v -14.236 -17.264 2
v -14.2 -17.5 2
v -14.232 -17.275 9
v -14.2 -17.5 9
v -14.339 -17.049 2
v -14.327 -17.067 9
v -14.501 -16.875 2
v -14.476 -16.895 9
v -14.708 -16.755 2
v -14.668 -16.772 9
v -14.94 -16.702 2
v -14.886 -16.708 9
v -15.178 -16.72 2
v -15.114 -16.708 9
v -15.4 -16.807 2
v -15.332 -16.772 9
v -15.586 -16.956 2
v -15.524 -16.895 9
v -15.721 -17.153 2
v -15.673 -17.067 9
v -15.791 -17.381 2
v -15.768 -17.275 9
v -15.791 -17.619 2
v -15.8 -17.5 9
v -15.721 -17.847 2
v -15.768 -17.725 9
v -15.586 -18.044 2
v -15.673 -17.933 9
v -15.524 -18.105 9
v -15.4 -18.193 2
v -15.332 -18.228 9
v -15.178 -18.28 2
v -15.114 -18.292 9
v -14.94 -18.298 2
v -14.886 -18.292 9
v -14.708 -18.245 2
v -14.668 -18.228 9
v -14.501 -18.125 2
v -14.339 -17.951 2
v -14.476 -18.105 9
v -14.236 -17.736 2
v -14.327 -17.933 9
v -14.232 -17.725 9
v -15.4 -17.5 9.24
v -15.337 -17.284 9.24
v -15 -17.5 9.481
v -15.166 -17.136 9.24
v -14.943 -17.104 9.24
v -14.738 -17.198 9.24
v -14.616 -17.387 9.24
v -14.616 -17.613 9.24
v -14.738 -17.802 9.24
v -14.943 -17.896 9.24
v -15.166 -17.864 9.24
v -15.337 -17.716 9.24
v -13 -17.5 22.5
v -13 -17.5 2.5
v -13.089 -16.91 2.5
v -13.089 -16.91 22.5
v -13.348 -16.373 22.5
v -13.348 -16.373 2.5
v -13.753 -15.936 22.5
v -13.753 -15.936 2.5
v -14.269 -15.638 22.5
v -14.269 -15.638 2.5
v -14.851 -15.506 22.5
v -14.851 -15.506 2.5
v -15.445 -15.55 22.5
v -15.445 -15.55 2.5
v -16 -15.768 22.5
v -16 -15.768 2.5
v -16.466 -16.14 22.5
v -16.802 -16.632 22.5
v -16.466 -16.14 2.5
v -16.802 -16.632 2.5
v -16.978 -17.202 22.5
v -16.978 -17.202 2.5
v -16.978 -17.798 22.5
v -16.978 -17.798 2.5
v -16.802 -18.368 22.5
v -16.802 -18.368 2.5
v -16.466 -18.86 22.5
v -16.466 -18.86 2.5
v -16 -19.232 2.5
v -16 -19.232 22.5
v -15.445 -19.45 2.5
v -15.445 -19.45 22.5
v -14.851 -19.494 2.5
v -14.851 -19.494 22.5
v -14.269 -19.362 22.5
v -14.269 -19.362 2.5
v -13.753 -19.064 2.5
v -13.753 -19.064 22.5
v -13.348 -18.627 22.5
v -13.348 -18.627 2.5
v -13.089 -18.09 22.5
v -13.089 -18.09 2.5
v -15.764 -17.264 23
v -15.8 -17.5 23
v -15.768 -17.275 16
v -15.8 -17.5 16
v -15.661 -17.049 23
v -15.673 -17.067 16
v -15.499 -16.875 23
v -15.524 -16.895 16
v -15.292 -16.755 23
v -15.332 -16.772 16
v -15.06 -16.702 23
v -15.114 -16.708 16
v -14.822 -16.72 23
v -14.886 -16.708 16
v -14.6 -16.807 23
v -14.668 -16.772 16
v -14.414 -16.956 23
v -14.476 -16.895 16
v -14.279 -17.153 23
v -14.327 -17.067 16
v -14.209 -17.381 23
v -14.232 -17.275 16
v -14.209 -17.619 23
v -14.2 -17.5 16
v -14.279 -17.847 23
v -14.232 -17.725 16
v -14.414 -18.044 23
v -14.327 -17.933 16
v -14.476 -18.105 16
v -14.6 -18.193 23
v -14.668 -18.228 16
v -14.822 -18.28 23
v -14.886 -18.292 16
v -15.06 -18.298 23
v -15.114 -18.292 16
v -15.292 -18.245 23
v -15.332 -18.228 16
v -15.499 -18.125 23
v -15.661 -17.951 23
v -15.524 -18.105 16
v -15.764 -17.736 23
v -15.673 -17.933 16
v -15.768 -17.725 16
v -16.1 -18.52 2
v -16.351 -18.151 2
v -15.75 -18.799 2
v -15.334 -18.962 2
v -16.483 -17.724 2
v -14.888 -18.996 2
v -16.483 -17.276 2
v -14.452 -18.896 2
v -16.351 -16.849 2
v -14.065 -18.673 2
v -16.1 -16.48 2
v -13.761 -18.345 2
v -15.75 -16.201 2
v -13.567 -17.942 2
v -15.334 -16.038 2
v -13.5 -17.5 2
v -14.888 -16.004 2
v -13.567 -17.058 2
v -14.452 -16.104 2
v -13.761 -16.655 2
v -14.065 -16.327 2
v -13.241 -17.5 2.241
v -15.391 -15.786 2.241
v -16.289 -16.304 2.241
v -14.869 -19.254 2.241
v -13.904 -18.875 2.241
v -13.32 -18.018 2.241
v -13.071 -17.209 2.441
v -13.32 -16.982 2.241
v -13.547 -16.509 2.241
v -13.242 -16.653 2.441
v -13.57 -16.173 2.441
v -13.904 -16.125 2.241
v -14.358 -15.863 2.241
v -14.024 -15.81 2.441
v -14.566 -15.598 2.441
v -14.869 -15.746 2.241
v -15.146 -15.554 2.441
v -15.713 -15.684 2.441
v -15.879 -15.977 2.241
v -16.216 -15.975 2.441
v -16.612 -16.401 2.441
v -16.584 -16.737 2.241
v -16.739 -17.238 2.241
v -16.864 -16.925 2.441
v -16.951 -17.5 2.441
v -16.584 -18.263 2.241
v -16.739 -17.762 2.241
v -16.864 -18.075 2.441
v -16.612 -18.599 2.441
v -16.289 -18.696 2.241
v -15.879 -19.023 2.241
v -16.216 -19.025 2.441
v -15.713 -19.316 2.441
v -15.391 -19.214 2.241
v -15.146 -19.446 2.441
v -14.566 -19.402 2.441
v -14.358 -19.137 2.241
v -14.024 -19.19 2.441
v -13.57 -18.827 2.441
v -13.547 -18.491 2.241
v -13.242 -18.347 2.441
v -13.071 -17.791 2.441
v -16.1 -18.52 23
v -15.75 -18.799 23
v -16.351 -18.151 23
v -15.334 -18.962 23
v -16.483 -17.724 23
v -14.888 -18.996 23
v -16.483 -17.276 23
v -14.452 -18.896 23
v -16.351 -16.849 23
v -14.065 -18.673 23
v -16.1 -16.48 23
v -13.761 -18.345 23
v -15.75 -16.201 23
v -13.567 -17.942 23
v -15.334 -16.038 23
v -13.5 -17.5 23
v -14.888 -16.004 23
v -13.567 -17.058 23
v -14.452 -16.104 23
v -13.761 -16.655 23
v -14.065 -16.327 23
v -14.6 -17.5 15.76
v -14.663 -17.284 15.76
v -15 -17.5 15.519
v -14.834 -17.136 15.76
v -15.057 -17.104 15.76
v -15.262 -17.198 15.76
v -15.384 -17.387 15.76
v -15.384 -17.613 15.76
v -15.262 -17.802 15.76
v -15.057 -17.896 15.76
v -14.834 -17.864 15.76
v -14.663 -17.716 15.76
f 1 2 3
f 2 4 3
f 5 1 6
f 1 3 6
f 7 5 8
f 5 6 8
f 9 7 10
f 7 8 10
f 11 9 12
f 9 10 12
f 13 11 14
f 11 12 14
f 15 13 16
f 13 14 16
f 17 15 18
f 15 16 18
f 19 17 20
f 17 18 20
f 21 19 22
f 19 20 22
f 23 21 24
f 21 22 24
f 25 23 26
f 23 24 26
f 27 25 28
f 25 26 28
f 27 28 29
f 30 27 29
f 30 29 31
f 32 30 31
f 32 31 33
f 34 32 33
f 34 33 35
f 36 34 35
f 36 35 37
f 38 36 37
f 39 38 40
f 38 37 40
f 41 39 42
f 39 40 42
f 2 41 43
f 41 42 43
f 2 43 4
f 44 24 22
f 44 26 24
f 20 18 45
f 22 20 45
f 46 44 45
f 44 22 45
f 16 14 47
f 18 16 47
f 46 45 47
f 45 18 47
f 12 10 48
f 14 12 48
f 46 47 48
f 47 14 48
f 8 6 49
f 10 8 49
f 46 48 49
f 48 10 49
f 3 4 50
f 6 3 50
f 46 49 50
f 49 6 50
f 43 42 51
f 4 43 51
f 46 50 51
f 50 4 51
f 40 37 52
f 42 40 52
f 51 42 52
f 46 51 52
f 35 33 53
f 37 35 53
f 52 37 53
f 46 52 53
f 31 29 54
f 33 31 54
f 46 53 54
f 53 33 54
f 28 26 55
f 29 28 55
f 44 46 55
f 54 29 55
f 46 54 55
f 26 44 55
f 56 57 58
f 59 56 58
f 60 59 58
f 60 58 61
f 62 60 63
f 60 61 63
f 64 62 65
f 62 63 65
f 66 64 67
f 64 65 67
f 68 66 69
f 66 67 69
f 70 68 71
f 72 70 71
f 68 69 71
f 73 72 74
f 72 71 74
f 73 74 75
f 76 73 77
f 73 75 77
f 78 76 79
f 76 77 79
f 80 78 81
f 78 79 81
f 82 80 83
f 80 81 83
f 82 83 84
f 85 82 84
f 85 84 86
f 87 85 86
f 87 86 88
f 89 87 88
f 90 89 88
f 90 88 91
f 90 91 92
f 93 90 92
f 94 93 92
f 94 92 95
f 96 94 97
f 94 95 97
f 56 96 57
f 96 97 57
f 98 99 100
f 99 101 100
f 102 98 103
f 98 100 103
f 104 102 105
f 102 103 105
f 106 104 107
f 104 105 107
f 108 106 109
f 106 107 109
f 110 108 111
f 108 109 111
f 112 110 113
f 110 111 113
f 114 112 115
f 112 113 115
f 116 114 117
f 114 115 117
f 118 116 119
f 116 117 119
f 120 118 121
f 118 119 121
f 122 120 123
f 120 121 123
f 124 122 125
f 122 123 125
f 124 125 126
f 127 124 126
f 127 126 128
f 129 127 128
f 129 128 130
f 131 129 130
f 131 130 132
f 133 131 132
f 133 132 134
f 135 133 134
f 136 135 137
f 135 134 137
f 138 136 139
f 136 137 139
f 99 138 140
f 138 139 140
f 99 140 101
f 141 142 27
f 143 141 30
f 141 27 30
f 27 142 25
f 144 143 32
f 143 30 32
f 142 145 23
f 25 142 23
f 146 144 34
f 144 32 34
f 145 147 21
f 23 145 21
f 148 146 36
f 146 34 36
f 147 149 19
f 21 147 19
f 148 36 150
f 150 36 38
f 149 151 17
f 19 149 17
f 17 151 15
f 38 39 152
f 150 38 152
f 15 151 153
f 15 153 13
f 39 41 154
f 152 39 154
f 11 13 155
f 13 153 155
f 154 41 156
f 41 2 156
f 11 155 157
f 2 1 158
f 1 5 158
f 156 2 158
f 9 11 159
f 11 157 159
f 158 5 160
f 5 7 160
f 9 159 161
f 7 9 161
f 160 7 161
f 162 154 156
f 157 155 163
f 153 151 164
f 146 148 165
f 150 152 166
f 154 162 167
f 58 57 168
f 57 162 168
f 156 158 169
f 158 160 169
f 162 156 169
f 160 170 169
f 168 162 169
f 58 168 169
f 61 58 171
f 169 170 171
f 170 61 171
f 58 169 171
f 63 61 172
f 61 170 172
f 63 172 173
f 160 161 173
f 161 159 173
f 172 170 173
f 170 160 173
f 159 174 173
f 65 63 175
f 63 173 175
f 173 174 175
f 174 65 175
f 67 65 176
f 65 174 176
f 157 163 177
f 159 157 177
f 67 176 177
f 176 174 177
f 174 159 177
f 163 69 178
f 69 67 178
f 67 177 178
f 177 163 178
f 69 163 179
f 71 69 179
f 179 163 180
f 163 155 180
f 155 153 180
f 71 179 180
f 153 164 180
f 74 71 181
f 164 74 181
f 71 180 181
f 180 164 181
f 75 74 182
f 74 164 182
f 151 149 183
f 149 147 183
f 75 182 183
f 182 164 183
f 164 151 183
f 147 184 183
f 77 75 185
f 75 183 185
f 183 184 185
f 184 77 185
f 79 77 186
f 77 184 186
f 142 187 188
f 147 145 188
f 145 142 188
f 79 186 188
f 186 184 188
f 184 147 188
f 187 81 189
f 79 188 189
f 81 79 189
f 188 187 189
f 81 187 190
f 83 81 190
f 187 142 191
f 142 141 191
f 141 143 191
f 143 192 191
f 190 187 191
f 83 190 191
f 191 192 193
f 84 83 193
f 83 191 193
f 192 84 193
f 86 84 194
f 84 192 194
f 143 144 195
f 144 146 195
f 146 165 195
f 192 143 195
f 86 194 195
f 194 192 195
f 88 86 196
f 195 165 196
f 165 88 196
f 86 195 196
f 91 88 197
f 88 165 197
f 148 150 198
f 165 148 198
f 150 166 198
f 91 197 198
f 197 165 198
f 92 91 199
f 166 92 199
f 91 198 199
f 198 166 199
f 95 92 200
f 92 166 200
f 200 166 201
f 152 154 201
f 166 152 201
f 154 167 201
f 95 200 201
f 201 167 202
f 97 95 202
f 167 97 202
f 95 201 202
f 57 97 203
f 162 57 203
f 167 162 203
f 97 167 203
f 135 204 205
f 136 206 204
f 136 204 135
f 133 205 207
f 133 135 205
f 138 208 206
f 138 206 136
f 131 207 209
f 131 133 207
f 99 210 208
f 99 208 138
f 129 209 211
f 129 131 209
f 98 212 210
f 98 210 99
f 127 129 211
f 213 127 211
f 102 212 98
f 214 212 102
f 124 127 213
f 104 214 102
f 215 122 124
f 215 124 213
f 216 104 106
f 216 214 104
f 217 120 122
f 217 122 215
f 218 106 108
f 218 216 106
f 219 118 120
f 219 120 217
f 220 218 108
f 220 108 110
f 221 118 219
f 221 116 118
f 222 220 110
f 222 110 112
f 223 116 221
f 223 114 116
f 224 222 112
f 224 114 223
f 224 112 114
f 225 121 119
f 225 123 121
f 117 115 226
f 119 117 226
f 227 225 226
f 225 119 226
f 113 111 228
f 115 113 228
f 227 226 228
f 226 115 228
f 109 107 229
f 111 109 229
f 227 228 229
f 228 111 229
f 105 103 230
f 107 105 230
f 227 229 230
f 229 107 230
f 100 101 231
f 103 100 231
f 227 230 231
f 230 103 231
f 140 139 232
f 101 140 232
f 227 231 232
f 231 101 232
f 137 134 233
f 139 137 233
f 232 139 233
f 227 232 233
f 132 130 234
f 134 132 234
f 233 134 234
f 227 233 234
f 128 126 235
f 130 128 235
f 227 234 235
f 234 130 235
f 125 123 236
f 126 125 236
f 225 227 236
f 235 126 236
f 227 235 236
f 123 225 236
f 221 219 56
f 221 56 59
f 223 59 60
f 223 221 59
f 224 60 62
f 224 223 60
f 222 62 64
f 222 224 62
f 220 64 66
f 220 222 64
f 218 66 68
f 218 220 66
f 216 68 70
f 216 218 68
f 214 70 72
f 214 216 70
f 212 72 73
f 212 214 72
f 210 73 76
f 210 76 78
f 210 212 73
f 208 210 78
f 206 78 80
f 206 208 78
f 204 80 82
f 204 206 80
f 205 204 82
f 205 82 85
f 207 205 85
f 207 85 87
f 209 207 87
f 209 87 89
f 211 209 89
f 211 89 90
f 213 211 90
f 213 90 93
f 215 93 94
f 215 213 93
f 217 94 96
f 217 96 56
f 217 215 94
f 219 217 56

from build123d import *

# Parameters (mm, degrees)
SKETCH_2_W             = 38
SKETCH_2_H             = 39
EXTRUDE_1_DEPTH        = 2
CHAMFER_3_SIZE         = 1
SKETCH_7_R             = 4.25
CUT_EXTRUDE_3_DEPTH    = 10
SKETCH_8_W             = 2
SKETCH_8_H             = 39
CUT_EXTRUDE_4_DEPTH    = 10
FILLET_3_R             = 2
SKETCH_9_R             = 2
EXTRUDE_1_2_DEPTH      = 21
SKETCH_10_W            = 3
SKETCH_10_H            = 39
CUT_EXTRUDE_1_DEPTH    = 10
FILLET_5_R             = 2
CHAMFER_5_SIZE         = 0.5
HOLE_WIZARD_M2_5_3_D   = 2.05
HOLE_WIZARD_M2_1_D     = 1.6
HOLE_WIZARD_M2_1_DEPTH = 7
HOLE_WIZARD_M2_1_TIP   = 0.480688495
CUT_EXTRUDE_2_DEPTH    = 10
SKETCH_24_W            = 71.290640242
SKETCH_24_H            = 51.144653494
CUT_EXTRUDE_3_2_DEPTH  = 10
SKETCH_25_R            = 6.539265834
CUT_EXTRUDE_4_2_DEPTH  = 32
HOLE_WIZARD_M2_2_D     = 1.6
HOLE_WIZARD_M2_2_DEPTH = 7
HOLE_WIZARD_M2_2_TIP   = 0.480688495
FILLET_6_SIZE          = 0.5


with BuildPart() as part:
    # 草图2 → Extrude 1 (new body)
    with BuildSketch(Plane.XY):
        Rectangle(SKETCH_2_W, SKETCH_2_H)
    extrude(amount=EXTRUDE_1_DEPTH)

    # 倒角3
    chamfer_3_edges = [part.edges().sort_by_distance(p)[0] for p in [
        (-19, 19.5, 1),
        (-19, -19.5, 1),
    ]]
    chamfer(chamfer_3_edges, length=CHAMFER_3_SIZE)

    # 草图7 → Cut-Extrude 3 (cut)
    with BuildSketch(Plane.XY.offset(2)):
        with Locations((2, 0)):
            Circle(SKETCH_7_R)
    extrude(amount=-CUT_EXTRUDE_3_DEPTH, mode=Mode.SUBTRACT)

    # 草图8 → Cut-Extrude 4 (cut)
    with BuildSketch(Plane.XY.offset(2)):
        with Locations((-18, 0)):
            Rectangle(SKETCH_8_W, SKETCH_8_H)
    extrude(amount=-CUT_EXTRUDE_4_DEPTH, mode=Mode.SUBTRACT)

    # 圆角3
    fillet_3_edges = [part.edges().sort_by_distance(p)[0] for p in [
        (-17, 19.5, 1),
        (-17, -19.5, 1),
    ]]
    fillet(fillet_3_edges, radius=FILLET_3_R)

    # 草图9 → Extrude 1 2 (add)
    with BuildSketch(Plane.XY.offset(2)):
        with Locations((-15, 17.5)):
            Circle(SKETCH_9_R)
        with Locations((-15, -17.5)):
            Circle(SKETCH_9_R)
    extrude_1_2 = extrude(amount=EXTRUDE_1_2_DEPTH)

    # 镜向1: Extrude 1 2 across plane
    add(extrude_1_2.mirror(Plane.ZX))

    # 草图10 → 切除-拉伸1 (cut)
    with BuildSketch(Plane(origin=(0, 0, 0), x_dir=(-1, 0, 0), z_dir=(0, 0, -1))):
        with Locations((-17.5, 0)):
            Rectangle(SKETCH_10_W, SKETCH_10_H)
    extrude(amount=-CUT_EXTRUDE_1_DEPTH, mode=Mode.SUBTRACT)

    # 圆角5
    fillet_5_edges = [part.edges().sort_by_distance(p)[0] for p in [
        (16, -19.5, 1),
        (16, 19.5, 1),
    ]]
    fillet(fillet_5_edges, radius=FILLET_5_R)

    # 倒角5
    chamfer_5_edges = [part.edges().sort_by_distance(p)[0] for p in [
        (-17, -17.5, 23),
        (-17, 17.5, 23),
        (15.414213562, 18.914213562, 0),
        (16, 0, 0),
        (-0.5, 19.5, 0),
        (15.414213562, -18.914213562, 0),
        (-16.414213562, 18.914213562, 0),
        (-0.5, -19.5, 0),
        (-17, 0, 0),
        (-16.414213562, -18.914213562, 0),
    ]]
    chamfer(chamfer_5_edges, length=CHAMFER_5_SIZE)

    # M2.5 螺纹孔3 (through all)
    with Locations(Plane(origin=(9.5, 15.5, 0), x_dir=(-1, 0, 0), z_dir=(0, 0, -1))):
        with Locations((0, 0), (15, 0), (0, -31), (15, -31)):
            Hole(HOLE_WIZARD_M2_5_3_D / 2)

    # M2 螺纹孔1
    with Locations(Plane(origin=(-15, 17.5, 23), x_dir=(1, 0, 0), z_dir=(0, 0, 1))):
        with Locations((0, 0), (0, -35)):
            Hole(HOLE_WIZARD_M2_1_D / 2, depth=HOLE_WIZARD_M2_1_DEPTH)
            with Locations((0, 0, -(HOLE_WIZARD_M2_1_DEPTH + HOLE_WIZARD_M2_1_TIP / 2))):  # 118° drill point
                Cone(0, HOLE_WIZARD_M2_1_D / 2, HOLE_WIZARD_M2_1_TIP, mode=Mode.SUBTRACT)

    # 草图23 → 切除-拉伸2 (cut)
    with BuildSketch(Plane(origin=(0, 0, 0), x_dir=(-1, 0, 0), z_dir=(0, 0, -1))):
        with BuildLine():
            Line((-0.95, 16.2), (-0.95, 9.8))
            ThreePointArc((-0.95, 9.8), (-2, 8.75), (-3.05, 9.8))
            Line((-3.05, 9.8), (-3.05, 16.2))
            ThreePointArc((-3.05, 16.2), (-2, 17.25), (-0.95, 16.2))
        make_face()
    cut_extrude_2 = extrude(amount=-CUT_EXTRUDE_2_DEPTH, mode=Mode.SUBTRACT)

    # 镜向2: 切除-拉伸2 across plane
    add(cut_extrude_2.mirror(Plane.ZX), mode=Mode.SUBTRACT)

    # 草图24 → Cut-Extrude 3 2 (cut)
    with BuildSketch(Plane.XY.offset(2)):
        Rectangle(SKETCH_24_W, SKETCH_24_H)
    extrude(amount=-CUT_EXTRUDE_3_2_DEPTH, mode=Mode.SUBTRACT)


with BuildPart() as cut_extrude_3_2_piece_1:
    # of the separate pieces the step leaves, piece 1, a body of its own (cut_extrude_3_2_pieces)
    add(part.part.solids().sort_by_distance((-13, 17.5, 22.5))[0])

    # 草图25 → Cut-Extrude 4 2 (cut)
    with BuildSketch(Plane(origin=(0, 0, 2), x_dir=(-1, 0, 0), z_dir=(0, 0, -1))):
        with Locations((15, 17.5)):
            Circle(SKETCH_25_R)
    extrude(amount=-CUT_EXTRUDE_4_2_DEPTH, mode=Mode.SUBTRACT)


with BuildPart() as cut_extrude_3_2_piece_2:
    # of the separate pieces the step leaves, piece 2, a body of its own (cut_extrude_3_2_pieces)
    add(part.part.solids().sort_by_distance((-13, -17.5, 2))[0])

    # M2 螺纹孔2
    with Locations(Plane(origin=(-15, -17.5, 2), x_dir=(-1, 0, 0), z_dir=(0, 0, -1))):
        with Locations((0, 0)):
            Hole(HOLE_WIZARD_M2_2_D / 2, depth=HOLE_WIZARD_M2_2_DEPTH)
            with Locations((0, 0, -(HOLE_WIZARD_M2_2_DEPTH + HOLE_WIZARD_M2_2_TIP / 2))):  # 118° drill point
                Cone(0, HOLE_WIZARD_M2_2_D / 2, HOLE_WIZARD_M2_2_TIP, mode=Mode.SUBTRACT)

    # 圆角6
    # a fillet whose section is not a circle: 0.5 mm, written as the material it takes off along each edge
    with BuildSketch(Plane(origin=(-15, -17.5, 2), x_dir=(1, 0, 0), z_dir=(0, -1, 0))) as fillet_6_piece_1:
        with BuildLine():
            Bezier((2, FILLET_6_SIZE), (2, 0), (2 - FILLET_6_SIZE, 0), weights=[1, 0.035355339, 1])
            Line((2 - FILLET_6_SIZE, 0), (2, 0))
            Line((2, 0), (2, FILLET_6_SIZE))
        make_face()
    revolve(axis=Axis((-15, -17.5, 2), (0, 0, 1)), mode=Mode.SUBTRACT)


solid = cut_extrude_3_2_piece_2.part
